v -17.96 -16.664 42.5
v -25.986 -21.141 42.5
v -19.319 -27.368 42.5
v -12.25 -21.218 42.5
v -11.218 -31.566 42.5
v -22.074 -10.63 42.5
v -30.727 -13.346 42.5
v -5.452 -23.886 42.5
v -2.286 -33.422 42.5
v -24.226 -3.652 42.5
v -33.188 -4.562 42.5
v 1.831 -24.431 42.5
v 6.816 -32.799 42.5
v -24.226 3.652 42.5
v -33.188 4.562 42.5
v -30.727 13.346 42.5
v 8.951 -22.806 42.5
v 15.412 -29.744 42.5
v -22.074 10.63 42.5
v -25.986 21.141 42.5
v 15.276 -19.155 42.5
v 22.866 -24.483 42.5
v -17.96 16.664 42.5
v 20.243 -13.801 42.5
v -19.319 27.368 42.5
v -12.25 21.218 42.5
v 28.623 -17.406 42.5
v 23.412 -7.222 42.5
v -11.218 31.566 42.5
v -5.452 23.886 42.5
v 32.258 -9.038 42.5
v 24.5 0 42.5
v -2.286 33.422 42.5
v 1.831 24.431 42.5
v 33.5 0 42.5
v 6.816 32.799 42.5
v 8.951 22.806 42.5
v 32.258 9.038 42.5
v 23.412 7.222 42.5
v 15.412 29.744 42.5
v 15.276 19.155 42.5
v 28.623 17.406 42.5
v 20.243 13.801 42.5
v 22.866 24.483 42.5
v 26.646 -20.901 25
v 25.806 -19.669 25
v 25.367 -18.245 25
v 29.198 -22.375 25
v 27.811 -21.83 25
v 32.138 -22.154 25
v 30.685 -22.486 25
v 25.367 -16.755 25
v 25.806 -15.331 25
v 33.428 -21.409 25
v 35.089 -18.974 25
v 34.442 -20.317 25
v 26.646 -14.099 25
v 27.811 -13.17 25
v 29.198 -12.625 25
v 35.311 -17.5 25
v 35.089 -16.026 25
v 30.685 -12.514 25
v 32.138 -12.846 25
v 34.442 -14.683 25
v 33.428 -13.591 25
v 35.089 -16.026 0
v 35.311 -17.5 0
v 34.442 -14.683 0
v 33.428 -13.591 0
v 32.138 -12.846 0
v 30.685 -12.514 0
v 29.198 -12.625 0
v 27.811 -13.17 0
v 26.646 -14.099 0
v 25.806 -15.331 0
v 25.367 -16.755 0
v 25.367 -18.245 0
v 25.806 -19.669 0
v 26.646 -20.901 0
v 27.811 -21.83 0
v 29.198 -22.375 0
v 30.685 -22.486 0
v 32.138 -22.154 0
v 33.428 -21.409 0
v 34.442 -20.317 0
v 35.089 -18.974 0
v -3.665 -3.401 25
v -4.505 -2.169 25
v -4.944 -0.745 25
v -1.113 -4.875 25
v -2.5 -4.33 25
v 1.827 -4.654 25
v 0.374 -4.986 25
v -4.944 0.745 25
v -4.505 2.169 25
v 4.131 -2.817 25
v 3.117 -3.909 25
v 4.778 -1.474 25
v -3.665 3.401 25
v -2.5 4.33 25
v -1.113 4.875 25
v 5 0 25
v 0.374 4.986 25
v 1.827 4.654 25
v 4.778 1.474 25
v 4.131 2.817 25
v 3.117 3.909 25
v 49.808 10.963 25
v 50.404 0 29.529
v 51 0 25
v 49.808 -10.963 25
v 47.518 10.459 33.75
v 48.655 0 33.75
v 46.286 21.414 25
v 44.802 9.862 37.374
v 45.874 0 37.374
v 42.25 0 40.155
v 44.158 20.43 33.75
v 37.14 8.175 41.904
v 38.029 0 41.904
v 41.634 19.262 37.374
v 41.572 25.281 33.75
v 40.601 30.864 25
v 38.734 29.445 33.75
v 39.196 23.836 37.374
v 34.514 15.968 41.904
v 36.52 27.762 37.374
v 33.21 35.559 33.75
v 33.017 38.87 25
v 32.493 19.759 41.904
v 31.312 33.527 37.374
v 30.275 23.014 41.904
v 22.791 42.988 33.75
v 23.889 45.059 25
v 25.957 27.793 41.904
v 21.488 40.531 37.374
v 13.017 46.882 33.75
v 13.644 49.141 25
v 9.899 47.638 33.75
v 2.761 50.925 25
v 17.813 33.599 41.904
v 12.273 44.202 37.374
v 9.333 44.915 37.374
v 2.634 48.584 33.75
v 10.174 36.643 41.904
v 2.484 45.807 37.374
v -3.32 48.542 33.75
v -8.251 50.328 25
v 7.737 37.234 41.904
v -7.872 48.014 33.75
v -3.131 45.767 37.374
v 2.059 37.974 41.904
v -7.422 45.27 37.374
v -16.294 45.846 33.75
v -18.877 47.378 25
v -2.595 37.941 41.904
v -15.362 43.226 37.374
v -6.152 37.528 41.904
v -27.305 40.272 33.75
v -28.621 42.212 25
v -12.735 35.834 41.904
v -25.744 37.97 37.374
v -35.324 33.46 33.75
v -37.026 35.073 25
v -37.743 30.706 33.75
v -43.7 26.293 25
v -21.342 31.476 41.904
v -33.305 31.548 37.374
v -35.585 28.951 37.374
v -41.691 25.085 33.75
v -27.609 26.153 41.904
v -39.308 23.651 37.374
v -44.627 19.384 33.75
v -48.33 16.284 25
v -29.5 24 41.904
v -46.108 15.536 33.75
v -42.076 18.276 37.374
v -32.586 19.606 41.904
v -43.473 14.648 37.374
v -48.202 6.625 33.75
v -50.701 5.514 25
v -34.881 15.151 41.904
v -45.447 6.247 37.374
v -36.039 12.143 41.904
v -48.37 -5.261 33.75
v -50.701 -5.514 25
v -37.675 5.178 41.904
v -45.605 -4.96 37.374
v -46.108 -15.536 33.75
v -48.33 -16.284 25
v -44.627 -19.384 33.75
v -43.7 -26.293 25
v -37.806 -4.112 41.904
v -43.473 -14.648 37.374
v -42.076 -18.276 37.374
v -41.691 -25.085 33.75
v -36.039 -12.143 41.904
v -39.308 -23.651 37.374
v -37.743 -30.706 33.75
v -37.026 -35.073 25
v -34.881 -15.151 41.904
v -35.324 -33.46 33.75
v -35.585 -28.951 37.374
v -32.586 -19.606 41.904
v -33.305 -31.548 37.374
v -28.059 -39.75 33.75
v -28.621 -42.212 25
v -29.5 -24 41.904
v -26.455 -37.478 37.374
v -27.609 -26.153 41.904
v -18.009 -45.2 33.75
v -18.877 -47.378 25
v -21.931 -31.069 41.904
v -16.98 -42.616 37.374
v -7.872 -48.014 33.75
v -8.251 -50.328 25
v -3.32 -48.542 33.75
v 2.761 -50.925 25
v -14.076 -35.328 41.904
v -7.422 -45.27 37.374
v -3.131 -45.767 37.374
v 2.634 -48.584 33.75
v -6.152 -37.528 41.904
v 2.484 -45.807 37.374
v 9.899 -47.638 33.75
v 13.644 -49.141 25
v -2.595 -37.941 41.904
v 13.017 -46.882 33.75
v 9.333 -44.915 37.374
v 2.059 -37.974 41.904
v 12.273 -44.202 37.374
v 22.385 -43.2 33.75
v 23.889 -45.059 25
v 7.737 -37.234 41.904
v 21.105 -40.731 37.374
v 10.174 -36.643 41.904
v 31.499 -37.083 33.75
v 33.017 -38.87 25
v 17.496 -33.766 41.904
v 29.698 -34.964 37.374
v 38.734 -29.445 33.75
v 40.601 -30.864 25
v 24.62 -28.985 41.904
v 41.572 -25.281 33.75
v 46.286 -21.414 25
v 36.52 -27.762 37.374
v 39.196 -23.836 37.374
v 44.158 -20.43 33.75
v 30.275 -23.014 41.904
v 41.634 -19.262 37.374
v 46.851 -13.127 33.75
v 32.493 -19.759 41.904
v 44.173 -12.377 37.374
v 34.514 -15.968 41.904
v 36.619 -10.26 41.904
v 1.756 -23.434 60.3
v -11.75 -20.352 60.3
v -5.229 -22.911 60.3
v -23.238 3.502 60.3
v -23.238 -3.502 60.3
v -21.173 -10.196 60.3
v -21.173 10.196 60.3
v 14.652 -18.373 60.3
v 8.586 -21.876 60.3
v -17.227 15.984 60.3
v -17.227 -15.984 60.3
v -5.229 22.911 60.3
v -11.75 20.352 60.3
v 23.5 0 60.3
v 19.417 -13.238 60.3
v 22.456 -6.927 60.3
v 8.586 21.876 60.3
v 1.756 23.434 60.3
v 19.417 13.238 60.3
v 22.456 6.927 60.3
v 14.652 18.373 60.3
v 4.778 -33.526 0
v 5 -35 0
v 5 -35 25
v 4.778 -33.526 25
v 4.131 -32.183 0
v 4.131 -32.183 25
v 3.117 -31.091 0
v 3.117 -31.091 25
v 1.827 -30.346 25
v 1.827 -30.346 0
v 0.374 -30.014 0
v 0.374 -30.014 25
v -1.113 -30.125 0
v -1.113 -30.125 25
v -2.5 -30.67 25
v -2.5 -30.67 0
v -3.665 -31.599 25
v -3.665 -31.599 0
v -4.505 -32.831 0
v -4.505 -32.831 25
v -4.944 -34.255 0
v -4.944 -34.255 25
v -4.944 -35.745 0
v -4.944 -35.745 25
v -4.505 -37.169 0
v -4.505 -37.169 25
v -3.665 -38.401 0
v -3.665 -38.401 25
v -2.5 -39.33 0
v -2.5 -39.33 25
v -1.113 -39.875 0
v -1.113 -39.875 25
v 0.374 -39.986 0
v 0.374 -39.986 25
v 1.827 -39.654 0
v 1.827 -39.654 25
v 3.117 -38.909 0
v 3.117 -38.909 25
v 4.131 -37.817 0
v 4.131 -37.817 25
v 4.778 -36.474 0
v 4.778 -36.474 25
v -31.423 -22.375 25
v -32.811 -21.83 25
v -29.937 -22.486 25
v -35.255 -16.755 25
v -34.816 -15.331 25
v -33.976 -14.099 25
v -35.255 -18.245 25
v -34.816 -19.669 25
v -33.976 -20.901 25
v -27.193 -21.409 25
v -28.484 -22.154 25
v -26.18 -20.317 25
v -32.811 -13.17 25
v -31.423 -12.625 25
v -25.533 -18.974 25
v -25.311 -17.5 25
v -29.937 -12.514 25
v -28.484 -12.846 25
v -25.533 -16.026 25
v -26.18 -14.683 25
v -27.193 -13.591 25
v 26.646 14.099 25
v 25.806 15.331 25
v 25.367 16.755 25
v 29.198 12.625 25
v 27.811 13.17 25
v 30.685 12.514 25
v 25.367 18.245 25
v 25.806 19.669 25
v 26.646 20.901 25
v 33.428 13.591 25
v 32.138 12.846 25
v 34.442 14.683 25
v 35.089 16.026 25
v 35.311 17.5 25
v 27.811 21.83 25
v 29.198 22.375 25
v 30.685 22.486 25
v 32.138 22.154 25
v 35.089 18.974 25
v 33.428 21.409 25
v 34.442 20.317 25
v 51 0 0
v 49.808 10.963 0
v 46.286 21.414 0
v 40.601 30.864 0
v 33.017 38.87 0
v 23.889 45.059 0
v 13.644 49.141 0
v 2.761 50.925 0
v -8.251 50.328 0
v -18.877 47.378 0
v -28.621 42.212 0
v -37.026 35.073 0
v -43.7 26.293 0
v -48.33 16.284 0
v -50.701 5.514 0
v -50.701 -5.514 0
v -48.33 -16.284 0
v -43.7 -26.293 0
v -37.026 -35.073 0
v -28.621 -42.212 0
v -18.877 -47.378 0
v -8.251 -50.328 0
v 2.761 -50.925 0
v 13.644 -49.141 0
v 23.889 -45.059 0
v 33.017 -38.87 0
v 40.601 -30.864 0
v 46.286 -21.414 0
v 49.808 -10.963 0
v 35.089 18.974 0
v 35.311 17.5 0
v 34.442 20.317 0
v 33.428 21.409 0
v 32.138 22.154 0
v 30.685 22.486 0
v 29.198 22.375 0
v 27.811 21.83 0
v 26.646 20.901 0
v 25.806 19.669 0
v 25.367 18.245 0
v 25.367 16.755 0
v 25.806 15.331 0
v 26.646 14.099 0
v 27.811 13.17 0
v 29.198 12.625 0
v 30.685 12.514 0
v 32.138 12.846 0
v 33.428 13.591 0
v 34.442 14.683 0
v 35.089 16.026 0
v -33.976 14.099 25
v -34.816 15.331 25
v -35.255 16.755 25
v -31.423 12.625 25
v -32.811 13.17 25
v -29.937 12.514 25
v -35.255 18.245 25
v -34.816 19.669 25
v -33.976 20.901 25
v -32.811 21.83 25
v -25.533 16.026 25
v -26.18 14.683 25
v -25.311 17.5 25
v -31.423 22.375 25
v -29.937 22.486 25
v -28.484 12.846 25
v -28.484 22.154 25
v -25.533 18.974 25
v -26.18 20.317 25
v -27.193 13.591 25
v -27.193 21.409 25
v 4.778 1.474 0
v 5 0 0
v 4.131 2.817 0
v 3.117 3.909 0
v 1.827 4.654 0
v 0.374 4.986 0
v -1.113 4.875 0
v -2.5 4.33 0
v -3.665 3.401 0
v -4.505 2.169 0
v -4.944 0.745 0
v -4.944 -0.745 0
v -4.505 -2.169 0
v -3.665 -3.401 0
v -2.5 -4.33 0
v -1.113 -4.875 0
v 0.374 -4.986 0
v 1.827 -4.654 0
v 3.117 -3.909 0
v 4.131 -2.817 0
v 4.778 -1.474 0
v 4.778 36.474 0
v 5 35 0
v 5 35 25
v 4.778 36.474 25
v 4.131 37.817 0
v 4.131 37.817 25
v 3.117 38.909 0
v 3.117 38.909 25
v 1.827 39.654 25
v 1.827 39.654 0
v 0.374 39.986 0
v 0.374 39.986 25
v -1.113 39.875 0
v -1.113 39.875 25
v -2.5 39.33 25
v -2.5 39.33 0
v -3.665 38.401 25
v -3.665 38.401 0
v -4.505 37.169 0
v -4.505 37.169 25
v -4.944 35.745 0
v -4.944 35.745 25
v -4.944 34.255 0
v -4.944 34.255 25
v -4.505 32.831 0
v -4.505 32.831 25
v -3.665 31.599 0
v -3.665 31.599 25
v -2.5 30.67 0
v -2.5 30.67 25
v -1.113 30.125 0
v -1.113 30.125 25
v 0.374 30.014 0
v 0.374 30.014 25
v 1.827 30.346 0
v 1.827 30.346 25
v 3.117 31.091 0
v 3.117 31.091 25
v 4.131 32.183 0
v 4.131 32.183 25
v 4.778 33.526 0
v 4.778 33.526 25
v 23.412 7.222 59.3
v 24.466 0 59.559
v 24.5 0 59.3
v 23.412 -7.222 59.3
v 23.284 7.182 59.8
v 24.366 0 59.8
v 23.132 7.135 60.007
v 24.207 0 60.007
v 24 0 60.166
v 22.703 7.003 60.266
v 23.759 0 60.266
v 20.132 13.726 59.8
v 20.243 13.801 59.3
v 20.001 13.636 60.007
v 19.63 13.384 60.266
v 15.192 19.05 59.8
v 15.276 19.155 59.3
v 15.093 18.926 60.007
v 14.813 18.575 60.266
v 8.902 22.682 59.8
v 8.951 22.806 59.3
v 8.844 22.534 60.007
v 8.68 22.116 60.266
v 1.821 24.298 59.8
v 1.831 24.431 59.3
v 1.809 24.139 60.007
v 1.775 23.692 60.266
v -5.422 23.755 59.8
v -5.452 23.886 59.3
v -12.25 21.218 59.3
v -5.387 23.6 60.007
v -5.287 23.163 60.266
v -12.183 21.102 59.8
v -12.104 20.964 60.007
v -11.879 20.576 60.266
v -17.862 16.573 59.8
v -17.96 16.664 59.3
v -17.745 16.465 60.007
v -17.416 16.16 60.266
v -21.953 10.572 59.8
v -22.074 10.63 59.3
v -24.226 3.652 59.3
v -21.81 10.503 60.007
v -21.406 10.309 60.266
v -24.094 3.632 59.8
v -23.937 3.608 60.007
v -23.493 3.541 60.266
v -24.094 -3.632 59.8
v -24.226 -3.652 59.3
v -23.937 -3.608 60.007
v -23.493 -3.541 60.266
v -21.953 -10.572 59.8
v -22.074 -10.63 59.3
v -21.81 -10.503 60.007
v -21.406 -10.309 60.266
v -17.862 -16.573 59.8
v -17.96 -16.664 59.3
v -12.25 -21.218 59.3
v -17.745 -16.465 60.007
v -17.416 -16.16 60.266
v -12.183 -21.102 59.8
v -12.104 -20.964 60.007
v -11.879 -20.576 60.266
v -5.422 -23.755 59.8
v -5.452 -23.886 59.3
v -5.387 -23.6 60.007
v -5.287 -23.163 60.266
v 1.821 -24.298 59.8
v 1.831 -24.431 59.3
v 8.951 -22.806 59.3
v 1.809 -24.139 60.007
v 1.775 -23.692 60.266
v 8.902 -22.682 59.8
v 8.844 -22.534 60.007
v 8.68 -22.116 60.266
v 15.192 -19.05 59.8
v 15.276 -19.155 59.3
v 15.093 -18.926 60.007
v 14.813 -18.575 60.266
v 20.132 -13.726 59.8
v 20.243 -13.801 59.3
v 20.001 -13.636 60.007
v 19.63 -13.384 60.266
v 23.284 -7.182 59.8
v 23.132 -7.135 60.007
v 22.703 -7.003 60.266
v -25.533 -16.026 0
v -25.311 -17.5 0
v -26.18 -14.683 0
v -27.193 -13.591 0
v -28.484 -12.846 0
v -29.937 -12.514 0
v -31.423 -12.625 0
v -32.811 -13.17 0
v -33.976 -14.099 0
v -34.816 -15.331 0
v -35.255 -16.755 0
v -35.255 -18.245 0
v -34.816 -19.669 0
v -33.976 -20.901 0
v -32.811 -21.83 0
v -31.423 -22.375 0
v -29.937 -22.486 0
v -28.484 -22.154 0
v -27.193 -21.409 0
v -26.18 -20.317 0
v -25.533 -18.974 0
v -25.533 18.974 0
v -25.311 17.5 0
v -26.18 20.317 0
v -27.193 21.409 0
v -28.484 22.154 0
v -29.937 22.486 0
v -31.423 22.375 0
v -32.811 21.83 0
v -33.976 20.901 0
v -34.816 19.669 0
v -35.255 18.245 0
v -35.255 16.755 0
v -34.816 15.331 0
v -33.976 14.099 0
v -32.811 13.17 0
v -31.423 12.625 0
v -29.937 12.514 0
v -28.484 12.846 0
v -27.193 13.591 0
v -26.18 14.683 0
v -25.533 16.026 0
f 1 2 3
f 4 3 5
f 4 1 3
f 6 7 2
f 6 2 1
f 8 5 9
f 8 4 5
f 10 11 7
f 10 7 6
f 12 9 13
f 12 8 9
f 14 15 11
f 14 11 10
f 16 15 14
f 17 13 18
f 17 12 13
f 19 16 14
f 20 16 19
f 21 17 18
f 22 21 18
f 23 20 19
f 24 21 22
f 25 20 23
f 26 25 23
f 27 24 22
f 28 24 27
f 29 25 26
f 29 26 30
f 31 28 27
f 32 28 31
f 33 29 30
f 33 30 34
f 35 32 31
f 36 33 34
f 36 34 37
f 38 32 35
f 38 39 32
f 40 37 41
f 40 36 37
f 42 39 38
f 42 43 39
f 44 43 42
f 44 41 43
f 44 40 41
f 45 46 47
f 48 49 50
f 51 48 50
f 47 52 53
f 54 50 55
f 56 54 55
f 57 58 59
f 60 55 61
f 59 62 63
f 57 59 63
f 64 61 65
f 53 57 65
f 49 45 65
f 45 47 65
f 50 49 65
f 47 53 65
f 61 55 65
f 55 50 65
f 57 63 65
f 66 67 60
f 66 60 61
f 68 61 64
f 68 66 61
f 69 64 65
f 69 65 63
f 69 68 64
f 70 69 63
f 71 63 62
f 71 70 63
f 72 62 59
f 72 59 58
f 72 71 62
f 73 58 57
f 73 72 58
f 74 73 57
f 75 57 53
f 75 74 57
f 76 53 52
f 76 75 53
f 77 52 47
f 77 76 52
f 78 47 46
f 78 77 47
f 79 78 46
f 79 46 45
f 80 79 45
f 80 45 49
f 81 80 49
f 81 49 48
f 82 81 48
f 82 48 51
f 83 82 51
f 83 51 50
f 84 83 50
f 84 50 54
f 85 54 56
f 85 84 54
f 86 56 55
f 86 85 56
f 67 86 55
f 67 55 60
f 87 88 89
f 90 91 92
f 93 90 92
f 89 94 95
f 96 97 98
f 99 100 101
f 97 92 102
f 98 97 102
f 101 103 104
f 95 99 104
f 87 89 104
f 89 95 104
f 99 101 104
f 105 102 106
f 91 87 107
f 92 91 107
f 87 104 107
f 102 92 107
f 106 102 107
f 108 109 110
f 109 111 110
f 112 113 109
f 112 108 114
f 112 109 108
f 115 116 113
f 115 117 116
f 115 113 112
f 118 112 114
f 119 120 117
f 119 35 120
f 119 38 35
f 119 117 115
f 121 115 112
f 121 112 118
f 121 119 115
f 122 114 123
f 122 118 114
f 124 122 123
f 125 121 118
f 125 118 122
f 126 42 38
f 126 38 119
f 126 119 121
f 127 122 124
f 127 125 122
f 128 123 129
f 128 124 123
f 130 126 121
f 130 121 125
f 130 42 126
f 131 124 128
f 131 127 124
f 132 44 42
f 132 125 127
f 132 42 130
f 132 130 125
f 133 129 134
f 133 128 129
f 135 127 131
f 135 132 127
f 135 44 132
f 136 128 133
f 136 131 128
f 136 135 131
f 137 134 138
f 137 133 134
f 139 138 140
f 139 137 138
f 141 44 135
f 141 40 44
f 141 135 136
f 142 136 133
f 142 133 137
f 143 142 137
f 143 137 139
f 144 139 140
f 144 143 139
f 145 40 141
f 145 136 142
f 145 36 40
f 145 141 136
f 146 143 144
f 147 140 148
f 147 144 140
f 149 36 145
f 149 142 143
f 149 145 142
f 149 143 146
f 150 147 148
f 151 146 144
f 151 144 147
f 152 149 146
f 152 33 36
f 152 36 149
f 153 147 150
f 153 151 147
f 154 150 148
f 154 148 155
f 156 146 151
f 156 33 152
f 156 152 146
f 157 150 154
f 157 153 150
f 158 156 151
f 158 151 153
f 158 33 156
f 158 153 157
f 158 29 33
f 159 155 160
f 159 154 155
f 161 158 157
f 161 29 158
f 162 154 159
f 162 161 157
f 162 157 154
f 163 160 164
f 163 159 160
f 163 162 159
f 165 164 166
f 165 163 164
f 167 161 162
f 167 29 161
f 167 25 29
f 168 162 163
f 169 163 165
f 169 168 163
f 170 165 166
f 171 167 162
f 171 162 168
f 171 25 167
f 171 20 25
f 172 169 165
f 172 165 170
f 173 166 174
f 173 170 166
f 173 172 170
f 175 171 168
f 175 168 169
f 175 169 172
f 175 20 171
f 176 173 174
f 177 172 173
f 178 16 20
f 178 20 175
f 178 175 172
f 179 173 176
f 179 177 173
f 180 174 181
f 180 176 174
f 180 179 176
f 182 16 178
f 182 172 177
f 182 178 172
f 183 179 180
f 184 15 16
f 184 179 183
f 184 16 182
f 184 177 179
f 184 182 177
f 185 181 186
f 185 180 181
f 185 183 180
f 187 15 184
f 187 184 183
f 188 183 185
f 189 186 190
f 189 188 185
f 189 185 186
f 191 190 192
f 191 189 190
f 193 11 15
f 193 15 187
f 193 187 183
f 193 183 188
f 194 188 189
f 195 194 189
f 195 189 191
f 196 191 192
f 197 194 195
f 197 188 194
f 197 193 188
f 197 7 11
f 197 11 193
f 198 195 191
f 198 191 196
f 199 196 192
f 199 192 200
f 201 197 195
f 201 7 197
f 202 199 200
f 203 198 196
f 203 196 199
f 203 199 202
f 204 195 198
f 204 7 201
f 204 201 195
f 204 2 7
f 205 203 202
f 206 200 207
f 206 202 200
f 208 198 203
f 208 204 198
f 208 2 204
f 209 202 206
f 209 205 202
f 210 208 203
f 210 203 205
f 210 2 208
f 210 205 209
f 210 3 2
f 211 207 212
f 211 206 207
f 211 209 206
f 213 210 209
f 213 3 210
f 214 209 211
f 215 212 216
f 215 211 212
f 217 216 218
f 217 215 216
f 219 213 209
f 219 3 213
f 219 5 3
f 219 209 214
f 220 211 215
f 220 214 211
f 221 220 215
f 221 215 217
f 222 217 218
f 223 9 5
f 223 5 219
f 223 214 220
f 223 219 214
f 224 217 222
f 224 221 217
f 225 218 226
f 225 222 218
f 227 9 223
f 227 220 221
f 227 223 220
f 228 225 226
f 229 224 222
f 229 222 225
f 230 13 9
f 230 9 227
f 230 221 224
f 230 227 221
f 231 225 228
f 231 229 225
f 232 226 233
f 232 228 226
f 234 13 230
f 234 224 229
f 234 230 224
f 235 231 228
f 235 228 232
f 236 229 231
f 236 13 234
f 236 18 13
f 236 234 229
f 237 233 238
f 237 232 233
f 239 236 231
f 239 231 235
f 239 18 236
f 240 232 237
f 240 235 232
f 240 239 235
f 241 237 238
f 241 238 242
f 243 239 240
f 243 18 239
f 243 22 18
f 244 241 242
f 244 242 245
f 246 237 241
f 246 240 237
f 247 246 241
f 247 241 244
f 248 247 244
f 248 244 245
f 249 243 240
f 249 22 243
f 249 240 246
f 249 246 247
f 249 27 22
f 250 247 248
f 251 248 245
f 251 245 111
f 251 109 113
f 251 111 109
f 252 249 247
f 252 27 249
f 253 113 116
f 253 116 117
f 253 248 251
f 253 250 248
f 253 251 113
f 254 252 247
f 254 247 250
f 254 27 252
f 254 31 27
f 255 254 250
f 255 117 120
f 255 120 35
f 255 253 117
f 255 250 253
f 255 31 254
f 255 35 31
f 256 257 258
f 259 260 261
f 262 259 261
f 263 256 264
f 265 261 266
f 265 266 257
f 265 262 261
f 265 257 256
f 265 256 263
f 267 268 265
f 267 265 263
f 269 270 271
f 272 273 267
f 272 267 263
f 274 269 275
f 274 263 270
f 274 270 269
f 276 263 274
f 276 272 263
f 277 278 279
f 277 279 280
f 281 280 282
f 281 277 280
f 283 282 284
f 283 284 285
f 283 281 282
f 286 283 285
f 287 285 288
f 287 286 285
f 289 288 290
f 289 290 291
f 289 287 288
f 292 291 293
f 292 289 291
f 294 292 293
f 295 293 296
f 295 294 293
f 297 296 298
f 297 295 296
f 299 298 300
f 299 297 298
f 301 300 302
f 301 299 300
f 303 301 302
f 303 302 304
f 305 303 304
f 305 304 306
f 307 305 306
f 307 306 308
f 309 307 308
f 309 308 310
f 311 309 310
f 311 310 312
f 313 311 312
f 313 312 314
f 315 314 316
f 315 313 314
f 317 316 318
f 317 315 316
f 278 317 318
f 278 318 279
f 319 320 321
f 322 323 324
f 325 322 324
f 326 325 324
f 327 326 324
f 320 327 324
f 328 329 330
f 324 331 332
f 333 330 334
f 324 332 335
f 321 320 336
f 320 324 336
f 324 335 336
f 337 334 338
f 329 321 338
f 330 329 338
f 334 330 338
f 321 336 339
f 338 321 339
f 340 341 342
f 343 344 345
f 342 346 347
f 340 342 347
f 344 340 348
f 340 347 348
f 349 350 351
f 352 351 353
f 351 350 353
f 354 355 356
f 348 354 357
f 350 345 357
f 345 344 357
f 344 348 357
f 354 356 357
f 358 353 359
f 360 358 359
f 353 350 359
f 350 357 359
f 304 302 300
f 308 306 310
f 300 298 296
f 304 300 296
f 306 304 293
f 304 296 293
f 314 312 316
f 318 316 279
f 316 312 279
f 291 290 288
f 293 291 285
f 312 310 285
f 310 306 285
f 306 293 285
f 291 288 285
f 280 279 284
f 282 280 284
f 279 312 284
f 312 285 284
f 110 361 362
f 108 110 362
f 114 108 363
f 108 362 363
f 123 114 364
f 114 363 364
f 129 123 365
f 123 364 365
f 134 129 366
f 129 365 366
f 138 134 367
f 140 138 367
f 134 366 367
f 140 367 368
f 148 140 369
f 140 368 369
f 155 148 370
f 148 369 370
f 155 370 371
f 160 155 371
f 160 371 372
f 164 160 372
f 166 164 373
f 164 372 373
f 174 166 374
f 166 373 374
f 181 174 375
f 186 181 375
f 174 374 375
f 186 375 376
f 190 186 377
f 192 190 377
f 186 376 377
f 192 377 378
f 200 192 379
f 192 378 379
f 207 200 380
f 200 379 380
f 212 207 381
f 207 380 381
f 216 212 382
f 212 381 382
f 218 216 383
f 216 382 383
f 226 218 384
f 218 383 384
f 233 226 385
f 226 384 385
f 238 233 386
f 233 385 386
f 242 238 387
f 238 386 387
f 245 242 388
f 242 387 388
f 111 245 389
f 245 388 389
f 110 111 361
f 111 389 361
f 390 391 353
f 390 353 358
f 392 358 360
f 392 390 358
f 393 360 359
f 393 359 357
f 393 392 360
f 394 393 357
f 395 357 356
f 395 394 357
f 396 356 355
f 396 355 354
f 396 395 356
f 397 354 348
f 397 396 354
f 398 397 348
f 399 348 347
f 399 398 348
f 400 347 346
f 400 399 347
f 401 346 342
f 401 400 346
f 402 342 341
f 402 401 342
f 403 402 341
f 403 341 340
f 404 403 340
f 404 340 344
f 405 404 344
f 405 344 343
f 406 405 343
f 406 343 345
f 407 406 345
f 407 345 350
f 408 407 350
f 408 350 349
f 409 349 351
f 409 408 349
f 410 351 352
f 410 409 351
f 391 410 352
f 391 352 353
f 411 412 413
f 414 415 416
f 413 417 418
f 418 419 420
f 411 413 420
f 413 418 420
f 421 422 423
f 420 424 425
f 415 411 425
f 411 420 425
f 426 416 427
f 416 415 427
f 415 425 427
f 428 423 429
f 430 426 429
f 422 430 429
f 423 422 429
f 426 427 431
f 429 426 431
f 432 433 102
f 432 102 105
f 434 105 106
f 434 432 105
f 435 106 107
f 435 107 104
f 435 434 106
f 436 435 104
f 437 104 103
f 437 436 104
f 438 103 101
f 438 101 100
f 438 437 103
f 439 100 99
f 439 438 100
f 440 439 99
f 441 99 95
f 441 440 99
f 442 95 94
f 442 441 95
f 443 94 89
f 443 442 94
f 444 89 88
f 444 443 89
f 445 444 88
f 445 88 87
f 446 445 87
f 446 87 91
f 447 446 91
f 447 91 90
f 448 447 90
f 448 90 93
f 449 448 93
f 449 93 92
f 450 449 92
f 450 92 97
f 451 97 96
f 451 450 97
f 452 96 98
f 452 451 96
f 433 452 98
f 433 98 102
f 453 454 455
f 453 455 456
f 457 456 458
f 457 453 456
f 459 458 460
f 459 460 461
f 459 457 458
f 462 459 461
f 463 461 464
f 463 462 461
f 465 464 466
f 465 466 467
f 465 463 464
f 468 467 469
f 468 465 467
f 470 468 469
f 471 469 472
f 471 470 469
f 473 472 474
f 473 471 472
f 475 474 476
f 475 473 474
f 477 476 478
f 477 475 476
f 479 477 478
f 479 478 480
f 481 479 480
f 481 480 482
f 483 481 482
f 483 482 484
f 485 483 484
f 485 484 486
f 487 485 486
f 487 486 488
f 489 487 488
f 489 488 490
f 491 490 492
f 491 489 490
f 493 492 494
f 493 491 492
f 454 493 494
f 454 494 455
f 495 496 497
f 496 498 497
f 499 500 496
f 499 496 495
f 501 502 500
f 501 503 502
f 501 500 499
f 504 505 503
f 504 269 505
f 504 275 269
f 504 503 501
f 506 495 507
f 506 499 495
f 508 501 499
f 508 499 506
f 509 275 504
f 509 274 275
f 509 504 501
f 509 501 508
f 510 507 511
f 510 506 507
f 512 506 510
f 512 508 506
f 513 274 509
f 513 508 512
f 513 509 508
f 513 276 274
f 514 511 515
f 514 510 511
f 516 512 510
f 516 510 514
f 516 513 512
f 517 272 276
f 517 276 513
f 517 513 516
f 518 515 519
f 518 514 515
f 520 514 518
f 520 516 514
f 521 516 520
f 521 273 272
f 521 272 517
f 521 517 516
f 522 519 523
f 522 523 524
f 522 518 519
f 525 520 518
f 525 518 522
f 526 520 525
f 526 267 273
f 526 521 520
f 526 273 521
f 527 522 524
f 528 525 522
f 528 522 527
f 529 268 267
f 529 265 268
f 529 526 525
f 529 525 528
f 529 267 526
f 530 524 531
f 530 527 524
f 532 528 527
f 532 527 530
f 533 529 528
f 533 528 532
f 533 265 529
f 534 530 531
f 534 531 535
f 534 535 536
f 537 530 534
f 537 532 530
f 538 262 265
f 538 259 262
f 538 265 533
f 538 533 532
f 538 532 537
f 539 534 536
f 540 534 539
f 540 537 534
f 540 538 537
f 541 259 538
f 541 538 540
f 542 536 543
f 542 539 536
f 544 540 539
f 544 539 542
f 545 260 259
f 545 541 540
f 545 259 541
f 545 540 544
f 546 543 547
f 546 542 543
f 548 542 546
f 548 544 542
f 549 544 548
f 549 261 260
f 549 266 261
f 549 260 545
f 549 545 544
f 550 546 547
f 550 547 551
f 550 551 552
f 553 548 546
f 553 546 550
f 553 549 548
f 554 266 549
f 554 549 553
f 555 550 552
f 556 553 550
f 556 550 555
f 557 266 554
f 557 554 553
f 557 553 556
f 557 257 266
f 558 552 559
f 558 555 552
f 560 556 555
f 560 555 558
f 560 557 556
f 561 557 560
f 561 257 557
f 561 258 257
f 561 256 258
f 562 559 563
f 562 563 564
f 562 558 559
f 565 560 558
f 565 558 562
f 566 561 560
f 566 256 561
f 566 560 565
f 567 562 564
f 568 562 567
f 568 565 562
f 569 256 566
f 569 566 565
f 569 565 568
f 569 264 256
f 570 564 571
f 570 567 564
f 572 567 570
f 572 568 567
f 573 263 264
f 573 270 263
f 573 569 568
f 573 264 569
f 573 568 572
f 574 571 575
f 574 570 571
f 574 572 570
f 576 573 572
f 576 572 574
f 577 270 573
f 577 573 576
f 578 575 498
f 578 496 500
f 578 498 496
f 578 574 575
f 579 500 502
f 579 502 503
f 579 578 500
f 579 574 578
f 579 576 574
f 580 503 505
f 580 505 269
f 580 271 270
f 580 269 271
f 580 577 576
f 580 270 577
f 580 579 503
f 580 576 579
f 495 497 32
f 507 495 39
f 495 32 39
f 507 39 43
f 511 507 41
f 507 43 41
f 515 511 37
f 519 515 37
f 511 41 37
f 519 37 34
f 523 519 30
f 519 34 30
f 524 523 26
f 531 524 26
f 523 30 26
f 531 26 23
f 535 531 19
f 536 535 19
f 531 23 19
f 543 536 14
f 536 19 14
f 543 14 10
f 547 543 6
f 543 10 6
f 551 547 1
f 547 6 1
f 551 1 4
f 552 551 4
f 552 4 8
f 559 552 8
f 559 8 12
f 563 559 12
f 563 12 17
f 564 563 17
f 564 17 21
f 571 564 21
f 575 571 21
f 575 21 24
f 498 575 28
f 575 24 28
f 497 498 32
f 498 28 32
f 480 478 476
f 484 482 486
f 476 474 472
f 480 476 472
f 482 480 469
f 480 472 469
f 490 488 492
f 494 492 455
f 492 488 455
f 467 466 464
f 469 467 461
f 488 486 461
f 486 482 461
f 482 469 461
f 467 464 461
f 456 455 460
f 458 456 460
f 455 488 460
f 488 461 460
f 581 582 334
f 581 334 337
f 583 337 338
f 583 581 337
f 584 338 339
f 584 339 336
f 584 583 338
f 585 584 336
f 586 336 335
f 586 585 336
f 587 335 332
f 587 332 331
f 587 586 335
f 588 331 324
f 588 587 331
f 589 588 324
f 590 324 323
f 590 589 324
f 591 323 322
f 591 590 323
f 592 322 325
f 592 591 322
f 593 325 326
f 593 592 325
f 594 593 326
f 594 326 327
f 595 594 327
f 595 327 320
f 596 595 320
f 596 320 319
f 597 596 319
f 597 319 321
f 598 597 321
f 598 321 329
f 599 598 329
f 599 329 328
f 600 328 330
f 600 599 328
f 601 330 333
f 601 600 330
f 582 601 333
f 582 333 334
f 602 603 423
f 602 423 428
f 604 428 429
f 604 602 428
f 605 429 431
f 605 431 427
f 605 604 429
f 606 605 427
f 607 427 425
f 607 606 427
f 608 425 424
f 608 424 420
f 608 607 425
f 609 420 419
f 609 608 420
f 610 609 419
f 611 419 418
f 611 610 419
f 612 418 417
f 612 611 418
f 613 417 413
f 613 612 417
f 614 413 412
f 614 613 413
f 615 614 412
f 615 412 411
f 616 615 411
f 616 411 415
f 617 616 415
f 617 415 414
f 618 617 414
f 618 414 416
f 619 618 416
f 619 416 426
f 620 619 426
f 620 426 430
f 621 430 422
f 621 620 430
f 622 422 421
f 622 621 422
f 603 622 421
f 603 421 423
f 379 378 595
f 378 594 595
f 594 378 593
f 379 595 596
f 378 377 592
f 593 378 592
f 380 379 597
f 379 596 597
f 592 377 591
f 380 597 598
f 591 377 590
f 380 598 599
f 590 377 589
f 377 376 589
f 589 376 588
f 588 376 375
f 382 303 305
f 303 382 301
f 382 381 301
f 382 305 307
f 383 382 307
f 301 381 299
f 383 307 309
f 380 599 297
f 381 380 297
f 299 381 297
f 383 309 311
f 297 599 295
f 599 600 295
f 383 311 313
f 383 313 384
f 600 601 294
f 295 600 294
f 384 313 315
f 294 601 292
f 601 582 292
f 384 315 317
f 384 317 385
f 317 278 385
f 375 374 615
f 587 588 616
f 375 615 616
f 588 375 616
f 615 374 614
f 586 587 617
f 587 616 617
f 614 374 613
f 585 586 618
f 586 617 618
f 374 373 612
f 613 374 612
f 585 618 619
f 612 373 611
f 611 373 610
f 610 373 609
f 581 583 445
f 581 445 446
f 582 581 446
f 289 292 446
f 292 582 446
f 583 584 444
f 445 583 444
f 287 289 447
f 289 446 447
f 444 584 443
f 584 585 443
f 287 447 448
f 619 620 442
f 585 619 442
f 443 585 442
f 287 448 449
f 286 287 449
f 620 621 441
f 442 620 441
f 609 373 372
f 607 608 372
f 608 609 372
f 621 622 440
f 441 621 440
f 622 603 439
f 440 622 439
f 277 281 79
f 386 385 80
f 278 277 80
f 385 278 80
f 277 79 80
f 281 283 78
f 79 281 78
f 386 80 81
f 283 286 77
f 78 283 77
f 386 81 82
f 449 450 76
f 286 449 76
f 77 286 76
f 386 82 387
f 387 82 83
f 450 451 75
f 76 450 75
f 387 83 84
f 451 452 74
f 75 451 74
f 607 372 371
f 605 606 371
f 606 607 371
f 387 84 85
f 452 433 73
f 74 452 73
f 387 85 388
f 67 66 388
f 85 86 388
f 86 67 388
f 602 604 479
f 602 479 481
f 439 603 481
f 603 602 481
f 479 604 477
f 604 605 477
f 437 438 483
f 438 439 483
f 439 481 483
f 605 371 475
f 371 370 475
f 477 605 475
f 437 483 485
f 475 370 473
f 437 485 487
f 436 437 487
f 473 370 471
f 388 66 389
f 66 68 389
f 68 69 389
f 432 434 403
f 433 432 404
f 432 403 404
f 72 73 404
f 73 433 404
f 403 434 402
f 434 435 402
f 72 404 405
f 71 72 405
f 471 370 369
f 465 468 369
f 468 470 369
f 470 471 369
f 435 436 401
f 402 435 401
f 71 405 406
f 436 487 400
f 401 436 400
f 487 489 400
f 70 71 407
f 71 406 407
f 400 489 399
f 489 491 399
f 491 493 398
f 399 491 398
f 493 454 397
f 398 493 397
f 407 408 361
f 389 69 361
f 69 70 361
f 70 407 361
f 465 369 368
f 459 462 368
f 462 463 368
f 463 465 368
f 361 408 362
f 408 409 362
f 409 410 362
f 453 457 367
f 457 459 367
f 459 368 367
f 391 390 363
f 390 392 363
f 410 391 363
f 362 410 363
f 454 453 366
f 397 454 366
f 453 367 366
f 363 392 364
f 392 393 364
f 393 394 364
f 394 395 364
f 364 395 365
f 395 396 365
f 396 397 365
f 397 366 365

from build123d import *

# Parameters (mm, degrees)
F0_R     = 51
F1_DEPTH = 42.5
F2_R     = 5
F3_DEPTH = 25
F4_R     = 17.5
F5_R     = 24.5
F6_DEPTH = 17.8
F7_R     = 1


with BuildPart() as f1:
    # F0 (on Top) → F1 (new body)
    with BuildSketch(Plane.XY):
        Circle(F0_R)
    extrude(amount=F1_DEPTH)

    # F2 (on Top) → F3 (cut)
    with BuildSketch(Plane.XY):
        with Locations((0, -35)):
            Circle(F2_R)
        with Locations((30.310889, -17.5)):
            Circle(F2_R)
        with Locations((30.310889, 17.5)):
            Circle(F2_R)
        with Locations((0, 35)):
            Circle(F2_R)
        with Locations((-30.310889, 17.5)):
            Circle(F2_R)
        with Locations((-30.310889, -17.5)):
            Circle(F2_R)
        Circle(F2_R)
    extrude(amount=F3_DEPTH, mode=Mode.SUBTRACT)

    # F4
    f4_edges = [f1.edges().sort_by_distance(p)[0] for p in [
        (-51, 0, 42.5),
    ]]
    fillet(f4_edges, radius=F4_R)

    # F5 (on face) → F6 (join)
    with BuildSketch(Plane.XY.offset(42.5)):
        Circle(F5_R)
    extrude(amount=F6_DEPTH)

    # F7
    f7_edges = [f1.edges().sort_by_distance(p)[0] for p in [
        (-24.5, 0, 60.3),
    ]]
    fillet(f7_edges, radius=F7_R)


solid = f1.part
